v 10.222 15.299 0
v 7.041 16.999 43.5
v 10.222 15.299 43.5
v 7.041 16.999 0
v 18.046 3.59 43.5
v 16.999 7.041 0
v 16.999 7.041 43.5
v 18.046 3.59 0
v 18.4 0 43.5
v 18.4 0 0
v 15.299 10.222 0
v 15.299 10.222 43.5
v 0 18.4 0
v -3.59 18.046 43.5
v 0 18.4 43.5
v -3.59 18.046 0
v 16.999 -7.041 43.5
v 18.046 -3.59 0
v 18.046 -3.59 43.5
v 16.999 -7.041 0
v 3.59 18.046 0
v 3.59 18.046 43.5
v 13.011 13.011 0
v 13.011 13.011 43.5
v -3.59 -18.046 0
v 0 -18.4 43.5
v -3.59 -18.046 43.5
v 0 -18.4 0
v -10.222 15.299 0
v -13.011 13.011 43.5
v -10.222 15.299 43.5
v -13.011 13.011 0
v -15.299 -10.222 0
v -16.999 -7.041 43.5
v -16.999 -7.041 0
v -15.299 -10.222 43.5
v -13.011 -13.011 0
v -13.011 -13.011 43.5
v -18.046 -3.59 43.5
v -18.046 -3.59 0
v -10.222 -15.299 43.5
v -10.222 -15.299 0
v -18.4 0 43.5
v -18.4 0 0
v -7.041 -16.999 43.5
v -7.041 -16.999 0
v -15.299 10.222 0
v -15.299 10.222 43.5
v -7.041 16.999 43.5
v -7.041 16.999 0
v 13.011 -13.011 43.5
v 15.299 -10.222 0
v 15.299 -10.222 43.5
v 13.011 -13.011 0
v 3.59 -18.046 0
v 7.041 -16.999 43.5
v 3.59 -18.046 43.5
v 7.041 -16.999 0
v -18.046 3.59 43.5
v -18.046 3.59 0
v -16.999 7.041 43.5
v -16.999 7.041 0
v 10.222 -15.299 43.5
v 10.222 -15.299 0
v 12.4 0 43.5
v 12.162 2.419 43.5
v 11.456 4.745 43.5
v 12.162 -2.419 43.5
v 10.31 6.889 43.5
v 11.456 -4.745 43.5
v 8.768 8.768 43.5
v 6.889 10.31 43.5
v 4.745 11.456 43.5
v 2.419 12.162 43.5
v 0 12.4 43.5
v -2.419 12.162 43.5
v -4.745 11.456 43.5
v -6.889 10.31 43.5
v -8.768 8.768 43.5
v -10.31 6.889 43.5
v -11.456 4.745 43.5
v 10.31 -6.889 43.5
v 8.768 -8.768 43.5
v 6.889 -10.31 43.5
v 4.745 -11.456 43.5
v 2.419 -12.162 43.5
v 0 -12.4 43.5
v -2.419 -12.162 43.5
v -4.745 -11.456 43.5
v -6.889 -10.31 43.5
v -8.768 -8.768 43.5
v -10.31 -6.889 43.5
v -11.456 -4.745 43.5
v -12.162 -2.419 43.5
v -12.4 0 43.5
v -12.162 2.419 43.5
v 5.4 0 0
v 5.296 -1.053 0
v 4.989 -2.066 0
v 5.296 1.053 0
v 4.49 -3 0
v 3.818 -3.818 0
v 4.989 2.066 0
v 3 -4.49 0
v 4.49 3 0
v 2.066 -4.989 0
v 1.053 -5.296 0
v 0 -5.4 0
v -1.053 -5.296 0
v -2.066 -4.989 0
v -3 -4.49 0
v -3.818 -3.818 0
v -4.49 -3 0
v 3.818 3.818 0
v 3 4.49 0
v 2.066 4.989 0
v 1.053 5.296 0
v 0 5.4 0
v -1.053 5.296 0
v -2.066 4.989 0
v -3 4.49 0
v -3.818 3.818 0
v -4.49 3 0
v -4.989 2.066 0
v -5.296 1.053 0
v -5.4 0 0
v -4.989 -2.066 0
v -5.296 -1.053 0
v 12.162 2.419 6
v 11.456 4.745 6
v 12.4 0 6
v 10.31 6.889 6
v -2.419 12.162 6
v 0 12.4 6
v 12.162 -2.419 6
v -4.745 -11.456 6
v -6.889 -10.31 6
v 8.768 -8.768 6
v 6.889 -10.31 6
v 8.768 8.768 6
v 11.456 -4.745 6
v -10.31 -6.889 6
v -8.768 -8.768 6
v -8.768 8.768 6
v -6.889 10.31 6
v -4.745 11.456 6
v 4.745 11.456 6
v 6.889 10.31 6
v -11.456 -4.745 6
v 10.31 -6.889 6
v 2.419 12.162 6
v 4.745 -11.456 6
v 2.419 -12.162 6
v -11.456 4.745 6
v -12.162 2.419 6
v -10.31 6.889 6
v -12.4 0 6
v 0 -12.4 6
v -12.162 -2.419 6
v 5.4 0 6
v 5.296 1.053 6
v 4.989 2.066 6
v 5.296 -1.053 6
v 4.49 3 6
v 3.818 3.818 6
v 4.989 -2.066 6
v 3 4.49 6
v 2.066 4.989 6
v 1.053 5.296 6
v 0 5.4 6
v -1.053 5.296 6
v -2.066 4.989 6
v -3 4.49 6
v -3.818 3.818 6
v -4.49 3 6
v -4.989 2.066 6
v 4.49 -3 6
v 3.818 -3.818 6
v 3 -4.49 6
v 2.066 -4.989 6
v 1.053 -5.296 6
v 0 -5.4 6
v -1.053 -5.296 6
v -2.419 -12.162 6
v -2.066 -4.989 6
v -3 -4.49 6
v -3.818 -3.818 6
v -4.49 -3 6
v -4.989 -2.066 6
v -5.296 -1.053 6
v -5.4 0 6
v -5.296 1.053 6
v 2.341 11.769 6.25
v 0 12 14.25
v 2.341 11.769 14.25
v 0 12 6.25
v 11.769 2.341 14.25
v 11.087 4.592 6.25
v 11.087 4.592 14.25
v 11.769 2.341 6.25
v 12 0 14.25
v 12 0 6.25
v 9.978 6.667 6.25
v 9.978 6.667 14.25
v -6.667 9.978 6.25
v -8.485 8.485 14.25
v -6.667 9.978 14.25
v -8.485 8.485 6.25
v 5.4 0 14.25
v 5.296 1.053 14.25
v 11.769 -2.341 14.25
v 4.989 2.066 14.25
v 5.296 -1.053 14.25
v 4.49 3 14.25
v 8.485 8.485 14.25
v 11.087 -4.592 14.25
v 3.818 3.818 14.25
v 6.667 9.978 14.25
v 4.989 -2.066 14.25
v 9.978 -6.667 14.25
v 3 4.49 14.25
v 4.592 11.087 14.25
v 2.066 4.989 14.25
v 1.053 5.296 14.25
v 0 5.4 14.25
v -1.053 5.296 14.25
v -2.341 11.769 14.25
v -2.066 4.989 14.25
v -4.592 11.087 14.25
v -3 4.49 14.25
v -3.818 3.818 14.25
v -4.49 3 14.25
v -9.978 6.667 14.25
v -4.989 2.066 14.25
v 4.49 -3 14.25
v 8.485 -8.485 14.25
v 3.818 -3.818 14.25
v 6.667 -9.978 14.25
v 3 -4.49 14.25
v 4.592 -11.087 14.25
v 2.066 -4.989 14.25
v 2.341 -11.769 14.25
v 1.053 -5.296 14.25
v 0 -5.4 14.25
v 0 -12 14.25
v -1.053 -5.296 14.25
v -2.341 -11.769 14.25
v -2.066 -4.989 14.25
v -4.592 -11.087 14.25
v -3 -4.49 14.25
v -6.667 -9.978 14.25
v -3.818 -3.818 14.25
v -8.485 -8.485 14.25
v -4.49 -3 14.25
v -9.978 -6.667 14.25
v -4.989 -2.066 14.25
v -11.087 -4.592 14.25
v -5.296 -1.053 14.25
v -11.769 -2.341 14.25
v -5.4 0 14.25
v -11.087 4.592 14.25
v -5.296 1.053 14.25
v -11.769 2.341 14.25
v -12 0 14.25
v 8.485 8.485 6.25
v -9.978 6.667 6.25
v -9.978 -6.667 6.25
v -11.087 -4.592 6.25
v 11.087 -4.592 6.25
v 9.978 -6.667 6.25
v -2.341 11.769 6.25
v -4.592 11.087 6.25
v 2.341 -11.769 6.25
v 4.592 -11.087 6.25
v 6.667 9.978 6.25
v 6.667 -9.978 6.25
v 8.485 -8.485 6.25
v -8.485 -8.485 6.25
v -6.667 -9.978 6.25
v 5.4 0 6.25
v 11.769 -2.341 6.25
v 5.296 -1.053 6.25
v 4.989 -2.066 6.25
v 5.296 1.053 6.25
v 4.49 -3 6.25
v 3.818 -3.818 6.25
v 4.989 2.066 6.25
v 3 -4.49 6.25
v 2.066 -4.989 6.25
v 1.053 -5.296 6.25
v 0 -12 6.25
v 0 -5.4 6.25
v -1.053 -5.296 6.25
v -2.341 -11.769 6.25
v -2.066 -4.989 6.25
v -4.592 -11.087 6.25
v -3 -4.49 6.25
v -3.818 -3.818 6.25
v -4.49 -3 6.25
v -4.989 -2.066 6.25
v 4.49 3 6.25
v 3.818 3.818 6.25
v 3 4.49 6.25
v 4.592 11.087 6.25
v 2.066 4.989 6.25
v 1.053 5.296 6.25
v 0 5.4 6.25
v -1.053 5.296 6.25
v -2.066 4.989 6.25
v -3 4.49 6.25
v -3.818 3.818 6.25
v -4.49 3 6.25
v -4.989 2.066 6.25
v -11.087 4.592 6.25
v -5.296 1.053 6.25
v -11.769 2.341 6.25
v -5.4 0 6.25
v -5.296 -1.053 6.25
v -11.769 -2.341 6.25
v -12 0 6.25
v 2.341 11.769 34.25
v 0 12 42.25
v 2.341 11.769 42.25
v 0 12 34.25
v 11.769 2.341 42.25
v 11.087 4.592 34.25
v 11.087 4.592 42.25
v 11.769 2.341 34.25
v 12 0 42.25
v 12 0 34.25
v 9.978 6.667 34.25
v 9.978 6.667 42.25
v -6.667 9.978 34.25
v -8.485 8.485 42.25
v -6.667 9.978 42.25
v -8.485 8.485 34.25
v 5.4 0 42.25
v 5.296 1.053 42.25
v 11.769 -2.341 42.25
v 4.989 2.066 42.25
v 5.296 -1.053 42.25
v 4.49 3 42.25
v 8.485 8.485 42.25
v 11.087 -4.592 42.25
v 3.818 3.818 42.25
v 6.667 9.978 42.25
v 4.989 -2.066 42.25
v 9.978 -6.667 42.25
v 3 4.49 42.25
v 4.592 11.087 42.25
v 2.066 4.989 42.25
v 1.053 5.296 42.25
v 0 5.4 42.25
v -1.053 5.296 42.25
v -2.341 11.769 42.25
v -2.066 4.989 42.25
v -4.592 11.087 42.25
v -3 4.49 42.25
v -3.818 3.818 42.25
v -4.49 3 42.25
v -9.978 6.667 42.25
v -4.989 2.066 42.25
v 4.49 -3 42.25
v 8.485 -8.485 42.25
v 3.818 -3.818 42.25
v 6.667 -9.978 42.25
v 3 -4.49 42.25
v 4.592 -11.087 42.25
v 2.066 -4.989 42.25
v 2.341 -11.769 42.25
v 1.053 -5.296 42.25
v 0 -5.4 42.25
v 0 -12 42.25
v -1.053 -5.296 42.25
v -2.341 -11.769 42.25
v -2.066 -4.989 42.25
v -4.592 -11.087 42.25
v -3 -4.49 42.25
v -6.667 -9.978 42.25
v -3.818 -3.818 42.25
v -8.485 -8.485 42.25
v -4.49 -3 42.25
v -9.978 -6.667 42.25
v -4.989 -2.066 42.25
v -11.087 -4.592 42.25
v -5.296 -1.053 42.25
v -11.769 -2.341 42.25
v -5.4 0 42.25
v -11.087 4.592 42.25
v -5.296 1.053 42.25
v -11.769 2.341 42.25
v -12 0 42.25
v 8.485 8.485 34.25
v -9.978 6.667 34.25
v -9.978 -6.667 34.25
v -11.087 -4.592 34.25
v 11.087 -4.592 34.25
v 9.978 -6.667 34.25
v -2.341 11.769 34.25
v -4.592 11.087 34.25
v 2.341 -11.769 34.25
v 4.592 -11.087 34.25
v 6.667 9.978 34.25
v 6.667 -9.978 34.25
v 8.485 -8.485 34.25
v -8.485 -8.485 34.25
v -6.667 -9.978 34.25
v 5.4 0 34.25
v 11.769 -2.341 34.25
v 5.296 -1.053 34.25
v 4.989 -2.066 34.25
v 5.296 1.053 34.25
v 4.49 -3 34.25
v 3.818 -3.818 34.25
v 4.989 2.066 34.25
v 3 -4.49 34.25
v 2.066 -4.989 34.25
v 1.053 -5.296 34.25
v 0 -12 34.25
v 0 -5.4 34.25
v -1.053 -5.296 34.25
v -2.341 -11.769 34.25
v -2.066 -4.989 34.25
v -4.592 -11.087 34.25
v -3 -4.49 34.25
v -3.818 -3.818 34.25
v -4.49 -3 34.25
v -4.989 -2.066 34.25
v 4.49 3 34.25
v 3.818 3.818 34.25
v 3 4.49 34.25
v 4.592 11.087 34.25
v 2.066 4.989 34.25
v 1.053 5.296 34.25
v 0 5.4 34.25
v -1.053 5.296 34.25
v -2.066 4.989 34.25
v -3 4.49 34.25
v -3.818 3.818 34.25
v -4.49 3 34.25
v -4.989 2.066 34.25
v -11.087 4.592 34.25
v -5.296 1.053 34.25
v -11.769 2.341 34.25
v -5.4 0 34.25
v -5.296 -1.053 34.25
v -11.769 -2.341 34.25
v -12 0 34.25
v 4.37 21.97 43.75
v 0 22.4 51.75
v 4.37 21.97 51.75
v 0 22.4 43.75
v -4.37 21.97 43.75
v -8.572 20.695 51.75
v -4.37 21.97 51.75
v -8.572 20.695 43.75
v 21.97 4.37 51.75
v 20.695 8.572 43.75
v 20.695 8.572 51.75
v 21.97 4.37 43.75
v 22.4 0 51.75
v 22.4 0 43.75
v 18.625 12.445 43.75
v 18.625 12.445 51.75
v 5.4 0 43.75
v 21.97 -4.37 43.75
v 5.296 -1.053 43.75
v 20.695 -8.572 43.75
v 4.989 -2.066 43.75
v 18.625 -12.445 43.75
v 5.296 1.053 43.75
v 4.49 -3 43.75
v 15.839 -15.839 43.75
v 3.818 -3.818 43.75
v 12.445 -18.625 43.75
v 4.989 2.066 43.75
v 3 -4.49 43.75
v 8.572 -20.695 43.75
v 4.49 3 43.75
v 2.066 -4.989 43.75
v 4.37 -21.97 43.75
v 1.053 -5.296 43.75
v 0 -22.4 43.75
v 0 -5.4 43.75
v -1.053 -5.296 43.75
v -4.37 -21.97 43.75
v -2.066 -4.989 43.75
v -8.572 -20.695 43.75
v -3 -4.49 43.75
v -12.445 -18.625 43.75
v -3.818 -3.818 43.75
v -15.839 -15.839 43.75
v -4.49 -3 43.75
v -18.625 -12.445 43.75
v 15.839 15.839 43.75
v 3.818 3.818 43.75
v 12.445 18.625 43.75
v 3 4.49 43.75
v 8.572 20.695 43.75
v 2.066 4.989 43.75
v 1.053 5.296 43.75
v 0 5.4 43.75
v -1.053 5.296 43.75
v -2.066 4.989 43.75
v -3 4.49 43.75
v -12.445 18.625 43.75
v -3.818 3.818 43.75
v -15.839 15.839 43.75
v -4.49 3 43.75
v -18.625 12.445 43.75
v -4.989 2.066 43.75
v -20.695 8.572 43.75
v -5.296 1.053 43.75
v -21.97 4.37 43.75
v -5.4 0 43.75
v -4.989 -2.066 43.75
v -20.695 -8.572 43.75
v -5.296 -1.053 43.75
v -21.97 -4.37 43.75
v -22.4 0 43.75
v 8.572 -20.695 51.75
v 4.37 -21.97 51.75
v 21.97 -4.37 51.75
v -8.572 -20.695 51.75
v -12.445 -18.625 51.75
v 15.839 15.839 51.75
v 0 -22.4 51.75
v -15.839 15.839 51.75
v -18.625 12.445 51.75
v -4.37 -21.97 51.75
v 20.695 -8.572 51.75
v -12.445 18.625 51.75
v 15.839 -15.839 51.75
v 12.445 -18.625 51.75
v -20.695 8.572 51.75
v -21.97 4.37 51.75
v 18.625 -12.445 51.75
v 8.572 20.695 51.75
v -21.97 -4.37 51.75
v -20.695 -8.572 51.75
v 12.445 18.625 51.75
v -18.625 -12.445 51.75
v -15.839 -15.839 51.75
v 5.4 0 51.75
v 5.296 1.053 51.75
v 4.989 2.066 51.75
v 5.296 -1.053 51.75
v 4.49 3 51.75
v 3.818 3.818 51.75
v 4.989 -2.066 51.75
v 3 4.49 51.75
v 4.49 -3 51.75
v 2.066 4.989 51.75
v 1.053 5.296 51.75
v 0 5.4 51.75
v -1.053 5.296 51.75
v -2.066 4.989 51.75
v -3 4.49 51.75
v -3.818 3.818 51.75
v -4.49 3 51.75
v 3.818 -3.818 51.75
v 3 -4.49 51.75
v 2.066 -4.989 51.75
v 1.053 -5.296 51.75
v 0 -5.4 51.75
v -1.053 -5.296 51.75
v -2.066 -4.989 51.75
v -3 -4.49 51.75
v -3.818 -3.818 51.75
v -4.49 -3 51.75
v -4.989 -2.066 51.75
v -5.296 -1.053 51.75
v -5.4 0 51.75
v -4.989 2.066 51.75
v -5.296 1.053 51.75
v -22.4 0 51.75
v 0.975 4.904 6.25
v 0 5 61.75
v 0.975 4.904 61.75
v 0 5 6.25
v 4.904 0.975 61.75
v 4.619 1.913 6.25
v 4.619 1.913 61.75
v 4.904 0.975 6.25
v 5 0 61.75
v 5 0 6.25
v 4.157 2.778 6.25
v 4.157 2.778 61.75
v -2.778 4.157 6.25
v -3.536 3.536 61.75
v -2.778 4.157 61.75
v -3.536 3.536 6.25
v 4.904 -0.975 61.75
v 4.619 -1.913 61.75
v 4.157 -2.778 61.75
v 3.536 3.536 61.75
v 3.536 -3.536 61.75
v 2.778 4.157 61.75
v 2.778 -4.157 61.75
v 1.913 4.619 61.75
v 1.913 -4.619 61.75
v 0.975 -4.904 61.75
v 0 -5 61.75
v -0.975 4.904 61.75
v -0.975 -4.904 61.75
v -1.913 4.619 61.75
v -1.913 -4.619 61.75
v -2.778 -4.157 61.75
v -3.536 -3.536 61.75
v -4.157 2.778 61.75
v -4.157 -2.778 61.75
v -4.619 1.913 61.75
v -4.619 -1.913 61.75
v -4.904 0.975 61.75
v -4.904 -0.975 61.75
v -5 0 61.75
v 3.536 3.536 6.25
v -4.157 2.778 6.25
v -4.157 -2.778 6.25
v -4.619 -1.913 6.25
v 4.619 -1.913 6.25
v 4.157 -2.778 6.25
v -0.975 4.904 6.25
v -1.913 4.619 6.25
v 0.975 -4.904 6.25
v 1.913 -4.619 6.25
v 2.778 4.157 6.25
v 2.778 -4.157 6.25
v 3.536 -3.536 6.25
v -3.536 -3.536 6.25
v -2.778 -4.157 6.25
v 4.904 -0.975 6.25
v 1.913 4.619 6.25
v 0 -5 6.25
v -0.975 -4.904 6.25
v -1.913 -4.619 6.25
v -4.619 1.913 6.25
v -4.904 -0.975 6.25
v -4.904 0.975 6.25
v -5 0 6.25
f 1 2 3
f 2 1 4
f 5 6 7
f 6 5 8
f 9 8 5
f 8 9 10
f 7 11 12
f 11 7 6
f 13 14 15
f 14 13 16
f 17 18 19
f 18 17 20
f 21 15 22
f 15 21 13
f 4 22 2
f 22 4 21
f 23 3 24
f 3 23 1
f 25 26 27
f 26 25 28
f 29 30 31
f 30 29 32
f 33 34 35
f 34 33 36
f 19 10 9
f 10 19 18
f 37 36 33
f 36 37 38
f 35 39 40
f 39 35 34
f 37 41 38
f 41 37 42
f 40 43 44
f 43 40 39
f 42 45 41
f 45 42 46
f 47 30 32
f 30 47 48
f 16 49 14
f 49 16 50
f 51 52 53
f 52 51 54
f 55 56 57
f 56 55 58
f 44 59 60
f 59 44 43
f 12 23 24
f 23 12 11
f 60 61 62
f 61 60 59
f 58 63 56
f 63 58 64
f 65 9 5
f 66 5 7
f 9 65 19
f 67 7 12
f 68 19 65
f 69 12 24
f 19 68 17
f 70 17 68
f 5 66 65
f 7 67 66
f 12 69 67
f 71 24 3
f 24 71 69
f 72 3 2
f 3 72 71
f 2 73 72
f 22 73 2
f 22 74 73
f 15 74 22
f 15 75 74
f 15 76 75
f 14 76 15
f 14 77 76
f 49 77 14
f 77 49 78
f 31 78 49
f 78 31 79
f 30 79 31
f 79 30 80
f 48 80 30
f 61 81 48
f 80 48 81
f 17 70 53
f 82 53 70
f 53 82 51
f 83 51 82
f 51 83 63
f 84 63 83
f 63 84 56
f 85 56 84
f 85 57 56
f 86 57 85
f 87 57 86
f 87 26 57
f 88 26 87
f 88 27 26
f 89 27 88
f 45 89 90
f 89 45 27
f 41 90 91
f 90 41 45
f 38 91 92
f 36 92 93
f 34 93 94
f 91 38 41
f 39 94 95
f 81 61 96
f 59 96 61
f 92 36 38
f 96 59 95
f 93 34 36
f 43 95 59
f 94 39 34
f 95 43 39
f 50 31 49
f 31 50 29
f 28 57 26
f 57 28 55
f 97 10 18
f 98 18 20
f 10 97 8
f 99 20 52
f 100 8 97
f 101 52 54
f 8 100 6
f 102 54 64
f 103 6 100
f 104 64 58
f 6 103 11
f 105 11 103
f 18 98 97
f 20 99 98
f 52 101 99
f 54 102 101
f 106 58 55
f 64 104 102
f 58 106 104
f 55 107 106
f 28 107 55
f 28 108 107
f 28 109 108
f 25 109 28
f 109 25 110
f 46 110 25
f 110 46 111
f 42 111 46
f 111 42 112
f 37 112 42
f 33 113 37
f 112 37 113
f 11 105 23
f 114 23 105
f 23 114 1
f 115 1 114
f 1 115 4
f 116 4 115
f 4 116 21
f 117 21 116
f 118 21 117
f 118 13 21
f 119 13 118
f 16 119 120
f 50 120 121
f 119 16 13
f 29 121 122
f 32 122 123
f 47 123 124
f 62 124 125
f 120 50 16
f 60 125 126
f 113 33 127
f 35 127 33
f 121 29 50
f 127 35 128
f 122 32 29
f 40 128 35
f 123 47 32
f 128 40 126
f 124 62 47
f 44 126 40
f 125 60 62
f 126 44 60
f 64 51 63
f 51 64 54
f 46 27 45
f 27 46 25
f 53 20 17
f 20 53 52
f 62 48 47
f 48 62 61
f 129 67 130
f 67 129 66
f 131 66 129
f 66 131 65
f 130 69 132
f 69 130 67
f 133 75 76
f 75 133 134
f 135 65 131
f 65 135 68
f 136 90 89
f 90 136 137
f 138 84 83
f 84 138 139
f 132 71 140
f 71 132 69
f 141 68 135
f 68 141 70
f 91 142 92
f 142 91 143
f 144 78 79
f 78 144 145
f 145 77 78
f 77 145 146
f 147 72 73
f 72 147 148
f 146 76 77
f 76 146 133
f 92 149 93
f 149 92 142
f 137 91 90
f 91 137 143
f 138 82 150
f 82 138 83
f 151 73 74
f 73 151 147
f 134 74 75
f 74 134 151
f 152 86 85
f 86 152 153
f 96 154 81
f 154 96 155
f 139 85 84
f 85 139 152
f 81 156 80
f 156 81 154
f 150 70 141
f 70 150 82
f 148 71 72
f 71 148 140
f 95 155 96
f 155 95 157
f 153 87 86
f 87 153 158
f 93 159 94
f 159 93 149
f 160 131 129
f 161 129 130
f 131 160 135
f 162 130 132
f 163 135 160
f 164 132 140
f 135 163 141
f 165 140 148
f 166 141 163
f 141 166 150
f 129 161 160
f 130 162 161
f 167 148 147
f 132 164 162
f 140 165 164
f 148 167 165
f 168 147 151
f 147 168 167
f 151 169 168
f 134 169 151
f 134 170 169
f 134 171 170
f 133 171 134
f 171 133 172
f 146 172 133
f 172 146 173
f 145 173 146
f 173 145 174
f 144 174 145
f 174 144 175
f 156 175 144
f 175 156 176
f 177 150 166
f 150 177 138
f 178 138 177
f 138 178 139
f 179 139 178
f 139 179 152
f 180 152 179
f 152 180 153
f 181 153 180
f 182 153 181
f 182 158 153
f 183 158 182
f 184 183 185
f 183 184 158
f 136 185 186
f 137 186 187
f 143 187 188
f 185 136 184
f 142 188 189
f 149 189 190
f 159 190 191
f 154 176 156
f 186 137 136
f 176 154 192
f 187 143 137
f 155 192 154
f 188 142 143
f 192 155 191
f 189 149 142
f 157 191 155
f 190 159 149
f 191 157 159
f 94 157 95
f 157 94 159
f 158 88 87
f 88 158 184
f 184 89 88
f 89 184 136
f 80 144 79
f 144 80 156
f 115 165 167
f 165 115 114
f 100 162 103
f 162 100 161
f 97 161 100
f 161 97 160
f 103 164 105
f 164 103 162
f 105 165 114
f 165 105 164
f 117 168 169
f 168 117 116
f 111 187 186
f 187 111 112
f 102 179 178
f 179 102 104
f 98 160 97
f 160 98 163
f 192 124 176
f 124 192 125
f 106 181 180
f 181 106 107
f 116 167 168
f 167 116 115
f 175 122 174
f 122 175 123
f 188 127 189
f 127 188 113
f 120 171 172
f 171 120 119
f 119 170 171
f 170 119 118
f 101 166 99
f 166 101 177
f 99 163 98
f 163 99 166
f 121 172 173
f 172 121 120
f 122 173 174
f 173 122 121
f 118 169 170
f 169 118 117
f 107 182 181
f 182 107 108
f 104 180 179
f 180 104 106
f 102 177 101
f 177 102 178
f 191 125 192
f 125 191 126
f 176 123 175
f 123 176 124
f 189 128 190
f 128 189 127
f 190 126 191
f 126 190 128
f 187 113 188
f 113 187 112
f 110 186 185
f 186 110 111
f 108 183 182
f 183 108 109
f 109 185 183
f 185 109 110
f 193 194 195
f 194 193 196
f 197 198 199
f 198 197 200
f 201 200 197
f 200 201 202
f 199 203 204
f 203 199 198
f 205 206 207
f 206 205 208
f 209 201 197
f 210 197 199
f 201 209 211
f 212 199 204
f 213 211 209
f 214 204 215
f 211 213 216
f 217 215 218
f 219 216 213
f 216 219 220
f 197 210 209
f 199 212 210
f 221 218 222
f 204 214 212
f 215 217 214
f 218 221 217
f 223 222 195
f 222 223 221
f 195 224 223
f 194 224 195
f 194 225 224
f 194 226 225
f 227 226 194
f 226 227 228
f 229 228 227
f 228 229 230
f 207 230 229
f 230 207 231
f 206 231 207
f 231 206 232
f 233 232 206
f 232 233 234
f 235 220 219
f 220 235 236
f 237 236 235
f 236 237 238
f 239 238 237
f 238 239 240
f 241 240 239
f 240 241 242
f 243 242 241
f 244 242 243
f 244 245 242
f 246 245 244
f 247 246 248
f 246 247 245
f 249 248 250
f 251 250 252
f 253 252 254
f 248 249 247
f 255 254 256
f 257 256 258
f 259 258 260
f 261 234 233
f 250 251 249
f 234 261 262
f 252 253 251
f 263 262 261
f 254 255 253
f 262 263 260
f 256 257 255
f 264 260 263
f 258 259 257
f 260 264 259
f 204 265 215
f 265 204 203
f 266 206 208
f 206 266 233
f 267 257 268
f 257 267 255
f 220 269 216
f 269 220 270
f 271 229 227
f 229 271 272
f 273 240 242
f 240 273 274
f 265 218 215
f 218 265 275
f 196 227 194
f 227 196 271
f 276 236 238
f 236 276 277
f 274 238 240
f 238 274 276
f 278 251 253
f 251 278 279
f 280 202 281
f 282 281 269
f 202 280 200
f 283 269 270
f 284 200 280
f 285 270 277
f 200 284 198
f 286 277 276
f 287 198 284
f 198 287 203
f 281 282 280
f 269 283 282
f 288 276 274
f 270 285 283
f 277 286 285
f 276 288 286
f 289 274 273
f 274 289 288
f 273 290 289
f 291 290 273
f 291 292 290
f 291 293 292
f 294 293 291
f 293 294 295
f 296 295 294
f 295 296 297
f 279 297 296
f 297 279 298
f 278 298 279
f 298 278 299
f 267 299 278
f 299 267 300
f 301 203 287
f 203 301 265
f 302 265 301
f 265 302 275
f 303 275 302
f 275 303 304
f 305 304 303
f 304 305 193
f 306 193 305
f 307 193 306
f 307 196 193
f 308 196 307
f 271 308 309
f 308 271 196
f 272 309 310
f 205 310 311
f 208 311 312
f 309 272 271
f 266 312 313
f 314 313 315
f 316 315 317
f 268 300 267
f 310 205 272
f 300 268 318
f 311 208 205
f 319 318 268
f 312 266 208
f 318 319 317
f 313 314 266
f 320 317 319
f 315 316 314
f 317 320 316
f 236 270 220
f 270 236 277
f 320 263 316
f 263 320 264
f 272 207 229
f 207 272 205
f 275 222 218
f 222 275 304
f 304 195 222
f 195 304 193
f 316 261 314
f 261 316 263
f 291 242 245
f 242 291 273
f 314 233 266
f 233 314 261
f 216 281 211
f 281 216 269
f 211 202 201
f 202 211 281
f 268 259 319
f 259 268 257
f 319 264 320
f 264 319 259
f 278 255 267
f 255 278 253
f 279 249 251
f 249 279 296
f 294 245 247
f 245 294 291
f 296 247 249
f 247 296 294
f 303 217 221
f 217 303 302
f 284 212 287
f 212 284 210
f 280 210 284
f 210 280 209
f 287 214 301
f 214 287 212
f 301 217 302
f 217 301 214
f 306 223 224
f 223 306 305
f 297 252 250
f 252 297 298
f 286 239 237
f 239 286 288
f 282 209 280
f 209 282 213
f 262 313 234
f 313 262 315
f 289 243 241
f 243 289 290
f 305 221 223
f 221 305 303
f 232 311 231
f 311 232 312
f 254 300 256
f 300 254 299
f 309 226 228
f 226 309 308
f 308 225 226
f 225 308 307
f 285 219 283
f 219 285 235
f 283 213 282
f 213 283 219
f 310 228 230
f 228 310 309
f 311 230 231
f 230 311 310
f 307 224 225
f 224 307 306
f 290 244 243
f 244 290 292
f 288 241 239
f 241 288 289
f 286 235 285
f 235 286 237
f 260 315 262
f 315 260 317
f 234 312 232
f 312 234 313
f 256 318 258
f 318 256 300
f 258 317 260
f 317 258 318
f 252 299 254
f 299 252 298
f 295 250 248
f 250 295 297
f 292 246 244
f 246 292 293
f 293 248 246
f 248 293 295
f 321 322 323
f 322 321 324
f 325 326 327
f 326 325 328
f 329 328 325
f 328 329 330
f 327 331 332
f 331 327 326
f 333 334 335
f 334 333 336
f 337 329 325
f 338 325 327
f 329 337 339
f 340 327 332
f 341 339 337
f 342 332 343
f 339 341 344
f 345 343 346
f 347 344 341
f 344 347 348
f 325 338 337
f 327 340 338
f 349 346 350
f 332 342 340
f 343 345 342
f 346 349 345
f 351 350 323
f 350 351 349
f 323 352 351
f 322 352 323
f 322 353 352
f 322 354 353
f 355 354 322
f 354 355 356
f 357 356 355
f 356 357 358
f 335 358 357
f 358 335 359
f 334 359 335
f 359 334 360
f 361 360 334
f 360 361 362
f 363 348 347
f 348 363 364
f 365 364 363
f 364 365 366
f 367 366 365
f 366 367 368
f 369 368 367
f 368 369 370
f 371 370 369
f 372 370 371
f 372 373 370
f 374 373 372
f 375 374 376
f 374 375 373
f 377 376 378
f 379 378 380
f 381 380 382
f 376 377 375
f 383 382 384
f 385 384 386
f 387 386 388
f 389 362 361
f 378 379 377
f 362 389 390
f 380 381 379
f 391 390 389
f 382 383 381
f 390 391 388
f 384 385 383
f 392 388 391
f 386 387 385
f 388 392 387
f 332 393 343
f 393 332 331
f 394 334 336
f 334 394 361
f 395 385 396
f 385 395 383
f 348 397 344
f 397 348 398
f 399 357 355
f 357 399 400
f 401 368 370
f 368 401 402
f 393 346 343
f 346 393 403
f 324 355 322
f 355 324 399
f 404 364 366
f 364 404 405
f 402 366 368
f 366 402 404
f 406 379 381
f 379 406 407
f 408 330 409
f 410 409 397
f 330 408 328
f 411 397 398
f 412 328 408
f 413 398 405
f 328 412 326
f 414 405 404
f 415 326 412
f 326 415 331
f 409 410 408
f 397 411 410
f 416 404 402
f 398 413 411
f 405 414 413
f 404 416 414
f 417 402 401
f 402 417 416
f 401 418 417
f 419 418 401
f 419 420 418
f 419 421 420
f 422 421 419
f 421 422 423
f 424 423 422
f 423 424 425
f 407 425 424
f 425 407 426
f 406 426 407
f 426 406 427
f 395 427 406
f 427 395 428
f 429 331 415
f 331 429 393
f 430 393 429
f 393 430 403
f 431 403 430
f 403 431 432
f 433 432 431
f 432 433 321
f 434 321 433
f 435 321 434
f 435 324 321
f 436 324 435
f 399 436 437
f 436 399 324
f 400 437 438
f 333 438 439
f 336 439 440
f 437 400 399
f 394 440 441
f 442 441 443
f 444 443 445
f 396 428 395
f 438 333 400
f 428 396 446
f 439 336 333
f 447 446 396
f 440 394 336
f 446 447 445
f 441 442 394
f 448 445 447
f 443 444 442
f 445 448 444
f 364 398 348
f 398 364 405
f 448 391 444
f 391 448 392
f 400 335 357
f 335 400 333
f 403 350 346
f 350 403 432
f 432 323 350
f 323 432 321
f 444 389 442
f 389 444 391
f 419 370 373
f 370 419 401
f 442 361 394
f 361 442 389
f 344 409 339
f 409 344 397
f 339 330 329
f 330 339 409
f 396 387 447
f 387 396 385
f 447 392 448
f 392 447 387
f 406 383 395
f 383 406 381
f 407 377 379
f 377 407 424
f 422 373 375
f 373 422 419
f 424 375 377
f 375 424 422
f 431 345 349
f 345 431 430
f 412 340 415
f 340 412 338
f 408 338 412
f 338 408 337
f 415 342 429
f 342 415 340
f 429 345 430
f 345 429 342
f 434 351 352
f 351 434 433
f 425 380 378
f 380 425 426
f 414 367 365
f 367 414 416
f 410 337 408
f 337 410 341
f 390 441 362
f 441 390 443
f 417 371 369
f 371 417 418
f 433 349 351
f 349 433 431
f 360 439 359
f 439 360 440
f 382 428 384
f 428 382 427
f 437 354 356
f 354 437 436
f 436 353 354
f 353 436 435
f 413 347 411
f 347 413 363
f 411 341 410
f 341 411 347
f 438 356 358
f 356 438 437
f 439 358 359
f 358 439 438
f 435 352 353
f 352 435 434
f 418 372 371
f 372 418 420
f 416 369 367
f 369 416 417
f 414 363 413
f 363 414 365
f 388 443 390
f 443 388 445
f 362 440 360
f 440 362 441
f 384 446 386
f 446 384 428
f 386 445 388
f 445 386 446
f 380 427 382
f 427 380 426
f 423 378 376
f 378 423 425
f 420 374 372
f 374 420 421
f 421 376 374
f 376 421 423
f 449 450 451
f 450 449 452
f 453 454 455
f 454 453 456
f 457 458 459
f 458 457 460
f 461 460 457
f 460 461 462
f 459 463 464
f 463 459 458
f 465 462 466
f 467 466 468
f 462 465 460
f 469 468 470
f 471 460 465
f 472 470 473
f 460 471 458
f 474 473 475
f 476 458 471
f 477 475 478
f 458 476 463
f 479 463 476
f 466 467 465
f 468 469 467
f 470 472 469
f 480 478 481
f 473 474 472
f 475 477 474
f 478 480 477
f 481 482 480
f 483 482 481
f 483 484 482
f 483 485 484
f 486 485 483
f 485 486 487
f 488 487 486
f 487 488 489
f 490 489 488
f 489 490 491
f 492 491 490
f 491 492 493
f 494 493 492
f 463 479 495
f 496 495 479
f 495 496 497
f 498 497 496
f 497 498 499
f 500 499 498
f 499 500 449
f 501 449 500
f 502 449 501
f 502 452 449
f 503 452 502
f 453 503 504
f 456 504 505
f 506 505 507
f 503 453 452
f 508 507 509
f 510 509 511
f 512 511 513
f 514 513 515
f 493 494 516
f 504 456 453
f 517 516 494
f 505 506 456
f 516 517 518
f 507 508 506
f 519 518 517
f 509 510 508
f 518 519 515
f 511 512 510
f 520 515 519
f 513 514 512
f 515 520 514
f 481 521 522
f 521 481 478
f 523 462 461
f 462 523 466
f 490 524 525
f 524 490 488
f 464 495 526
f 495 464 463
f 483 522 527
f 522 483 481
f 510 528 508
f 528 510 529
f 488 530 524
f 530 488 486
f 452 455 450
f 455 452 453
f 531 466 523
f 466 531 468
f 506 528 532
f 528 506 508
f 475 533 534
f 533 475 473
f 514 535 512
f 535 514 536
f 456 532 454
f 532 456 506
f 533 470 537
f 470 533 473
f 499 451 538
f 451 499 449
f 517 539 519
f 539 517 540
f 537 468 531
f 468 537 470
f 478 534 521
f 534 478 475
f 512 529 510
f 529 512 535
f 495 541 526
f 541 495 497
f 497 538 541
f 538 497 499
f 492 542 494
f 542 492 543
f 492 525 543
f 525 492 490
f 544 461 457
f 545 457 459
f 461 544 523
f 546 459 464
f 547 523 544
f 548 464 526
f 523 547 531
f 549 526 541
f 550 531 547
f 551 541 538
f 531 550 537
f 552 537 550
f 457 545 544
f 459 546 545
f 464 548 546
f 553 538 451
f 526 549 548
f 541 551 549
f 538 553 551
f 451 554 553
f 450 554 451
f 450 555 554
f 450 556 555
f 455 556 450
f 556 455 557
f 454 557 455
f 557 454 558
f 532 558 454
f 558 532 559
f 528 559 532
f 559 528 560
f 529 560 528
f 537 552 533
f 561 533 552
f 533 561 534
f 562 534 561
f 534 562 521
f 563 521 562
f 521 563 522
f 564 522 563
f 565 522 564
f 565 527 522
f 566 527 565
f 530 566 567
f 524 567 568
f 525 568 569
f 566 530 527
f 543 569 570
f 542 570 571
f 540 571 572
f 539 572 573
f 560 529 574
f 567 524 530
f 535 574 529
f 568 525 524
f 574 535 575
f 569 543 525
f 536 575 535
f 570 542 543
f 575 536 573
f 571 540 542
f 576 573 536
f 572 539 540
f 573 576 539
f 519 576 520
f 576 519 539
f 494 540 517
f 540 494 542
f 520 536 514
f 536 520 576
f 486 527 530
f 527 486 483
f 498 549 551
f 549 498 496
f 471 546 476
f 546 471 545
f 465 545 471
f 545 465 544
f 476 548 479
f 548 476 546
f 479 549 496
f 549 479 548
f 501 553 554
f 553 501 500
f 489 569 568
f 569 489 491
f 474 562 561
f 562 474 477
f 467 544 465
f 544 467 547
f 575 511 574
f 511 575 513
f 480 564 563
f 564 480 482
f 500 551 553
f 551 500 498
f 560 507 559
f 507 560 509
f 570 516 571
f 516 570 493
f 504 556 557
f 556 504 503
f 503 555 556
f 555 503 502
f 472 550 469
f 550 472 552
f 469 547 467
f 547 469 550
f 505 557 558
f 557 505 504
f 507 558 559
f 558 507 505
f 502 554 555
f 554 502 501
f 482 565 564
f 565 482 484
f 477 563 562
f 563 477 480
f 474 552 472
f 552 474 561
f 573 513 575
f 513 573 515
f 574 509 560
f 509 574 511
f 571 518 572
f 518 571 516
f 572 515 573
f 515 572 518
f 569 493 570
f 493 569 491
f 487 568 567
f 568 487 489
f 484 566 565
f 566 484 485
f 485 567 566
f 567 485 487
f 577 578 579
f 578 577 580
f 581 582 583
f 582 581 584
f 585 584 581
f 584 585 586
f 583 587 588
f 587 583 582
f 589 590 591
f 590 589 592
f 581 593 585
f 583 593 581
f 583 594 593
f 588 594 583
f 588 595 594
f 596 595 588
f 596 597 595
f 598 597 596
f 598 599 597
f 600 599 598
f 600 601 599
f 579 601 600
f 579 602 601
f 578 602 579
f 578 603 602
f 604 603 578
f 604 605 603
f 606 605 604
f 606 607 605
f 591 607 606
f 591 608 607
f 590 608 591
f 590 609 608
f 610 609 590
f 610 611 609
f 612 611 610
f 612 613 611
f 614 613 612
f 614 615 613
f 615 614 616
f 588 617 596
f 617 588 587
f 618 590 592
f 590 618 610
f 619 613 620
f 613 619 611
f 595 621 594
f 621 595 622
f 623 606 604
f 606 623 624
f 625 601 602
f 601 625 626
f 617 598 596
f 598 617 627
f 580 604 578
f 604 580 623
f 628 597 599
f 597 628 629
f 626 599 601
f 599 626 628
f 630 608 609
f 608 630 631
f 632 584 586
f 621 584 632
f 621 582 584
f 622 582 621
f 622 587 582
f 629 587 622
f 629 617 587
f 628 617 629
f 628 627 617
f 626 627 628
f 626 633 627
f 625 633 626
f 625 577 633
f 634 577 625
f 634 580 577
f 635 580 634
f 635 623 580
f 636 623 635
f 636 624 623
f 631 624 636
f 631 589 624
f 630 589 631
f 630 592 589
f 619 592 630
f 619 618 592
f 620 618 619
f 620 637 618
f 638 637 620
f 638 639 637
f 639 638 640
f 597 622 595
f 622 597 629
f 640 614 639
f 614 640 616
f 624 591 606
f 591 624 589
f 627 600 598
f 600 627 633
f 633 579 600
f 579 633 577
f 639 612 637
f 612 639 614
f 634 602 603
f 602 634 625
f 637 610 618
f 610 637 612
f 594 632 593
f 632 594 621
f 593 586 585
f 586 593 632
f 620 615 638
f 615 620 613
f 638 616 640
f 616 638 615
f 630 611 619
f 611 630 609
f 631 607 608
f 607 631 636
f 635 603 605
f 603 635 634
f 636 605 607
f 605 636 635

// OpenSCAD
$fn = 32;

// ------------------------------------------------------------------------
// Shaft station: cup d36.8 x 43.5 mm, shaft d10
// Every part is its own module, assembly() places every instance.
// ------------------------------------------------------------------------

// --- part 1 ---
module housing_cup() {
  difference() {
    cylinder(h = 43.5, d = 36.8);
    translate([0, 0, 6]) cylinder(h = 38.5, d = 24.8);
    translate([0, 0, -1]) cylinder(h = 8, d = 10.8);
  }
}

// --- part 2 ---
module bearing_lower() {
  difference() {
      translate([0, 0, 0]) cylinder(h = 8, d = 24);
      translate([0, 0, -1]) cylinder(h = 10, d = 10.8);
    }
}

// --- part 3 ---
module bearing_upper() {
  difference() {
      translate([0, 0, 0]) cylinder(h = 8, d = 24);
      translate([0, 0, -1]) cylinder(h = 10, d = 10.8);
    }
}

// --- part 4 ---
module station_shaft() {
  translate([0, 0, -27.75]) cylinder(h = 55.5, d = 10);
}

// --- part 5 ---
module station_cover() {
  difference() {
    cylinder(h = 8, d = 44.8);
    translate([0, 0, -1]) cylinder(h = 10, d = 10.8);
  }
}

// --- assembly ---
module assembly() {
  color([0.80, 0.24, 0.20]) translate([0, 0, 0]) rotate([0, 0, 0]) housing_cup();
  color([0.20, 0.45, 0.75]) translate([0, 0, 6.25]) rotate([0, 0, 0]) bearing_lower();
  color([0.25, 0.62, 0.32]) translate([0, 0, 34.25]) rotate([0, 0, 0]) bearing_upper();
  color([0.92, 0.70, 0.18]) translate([0, 0, 34]) rotate([0, 0, 0]) station_shaft();
  color([0.58, 0.35, 0.70]) translate([0, 0, 43.75]) rotate([0, 0, 0]) station_cover();
}

assembly();
